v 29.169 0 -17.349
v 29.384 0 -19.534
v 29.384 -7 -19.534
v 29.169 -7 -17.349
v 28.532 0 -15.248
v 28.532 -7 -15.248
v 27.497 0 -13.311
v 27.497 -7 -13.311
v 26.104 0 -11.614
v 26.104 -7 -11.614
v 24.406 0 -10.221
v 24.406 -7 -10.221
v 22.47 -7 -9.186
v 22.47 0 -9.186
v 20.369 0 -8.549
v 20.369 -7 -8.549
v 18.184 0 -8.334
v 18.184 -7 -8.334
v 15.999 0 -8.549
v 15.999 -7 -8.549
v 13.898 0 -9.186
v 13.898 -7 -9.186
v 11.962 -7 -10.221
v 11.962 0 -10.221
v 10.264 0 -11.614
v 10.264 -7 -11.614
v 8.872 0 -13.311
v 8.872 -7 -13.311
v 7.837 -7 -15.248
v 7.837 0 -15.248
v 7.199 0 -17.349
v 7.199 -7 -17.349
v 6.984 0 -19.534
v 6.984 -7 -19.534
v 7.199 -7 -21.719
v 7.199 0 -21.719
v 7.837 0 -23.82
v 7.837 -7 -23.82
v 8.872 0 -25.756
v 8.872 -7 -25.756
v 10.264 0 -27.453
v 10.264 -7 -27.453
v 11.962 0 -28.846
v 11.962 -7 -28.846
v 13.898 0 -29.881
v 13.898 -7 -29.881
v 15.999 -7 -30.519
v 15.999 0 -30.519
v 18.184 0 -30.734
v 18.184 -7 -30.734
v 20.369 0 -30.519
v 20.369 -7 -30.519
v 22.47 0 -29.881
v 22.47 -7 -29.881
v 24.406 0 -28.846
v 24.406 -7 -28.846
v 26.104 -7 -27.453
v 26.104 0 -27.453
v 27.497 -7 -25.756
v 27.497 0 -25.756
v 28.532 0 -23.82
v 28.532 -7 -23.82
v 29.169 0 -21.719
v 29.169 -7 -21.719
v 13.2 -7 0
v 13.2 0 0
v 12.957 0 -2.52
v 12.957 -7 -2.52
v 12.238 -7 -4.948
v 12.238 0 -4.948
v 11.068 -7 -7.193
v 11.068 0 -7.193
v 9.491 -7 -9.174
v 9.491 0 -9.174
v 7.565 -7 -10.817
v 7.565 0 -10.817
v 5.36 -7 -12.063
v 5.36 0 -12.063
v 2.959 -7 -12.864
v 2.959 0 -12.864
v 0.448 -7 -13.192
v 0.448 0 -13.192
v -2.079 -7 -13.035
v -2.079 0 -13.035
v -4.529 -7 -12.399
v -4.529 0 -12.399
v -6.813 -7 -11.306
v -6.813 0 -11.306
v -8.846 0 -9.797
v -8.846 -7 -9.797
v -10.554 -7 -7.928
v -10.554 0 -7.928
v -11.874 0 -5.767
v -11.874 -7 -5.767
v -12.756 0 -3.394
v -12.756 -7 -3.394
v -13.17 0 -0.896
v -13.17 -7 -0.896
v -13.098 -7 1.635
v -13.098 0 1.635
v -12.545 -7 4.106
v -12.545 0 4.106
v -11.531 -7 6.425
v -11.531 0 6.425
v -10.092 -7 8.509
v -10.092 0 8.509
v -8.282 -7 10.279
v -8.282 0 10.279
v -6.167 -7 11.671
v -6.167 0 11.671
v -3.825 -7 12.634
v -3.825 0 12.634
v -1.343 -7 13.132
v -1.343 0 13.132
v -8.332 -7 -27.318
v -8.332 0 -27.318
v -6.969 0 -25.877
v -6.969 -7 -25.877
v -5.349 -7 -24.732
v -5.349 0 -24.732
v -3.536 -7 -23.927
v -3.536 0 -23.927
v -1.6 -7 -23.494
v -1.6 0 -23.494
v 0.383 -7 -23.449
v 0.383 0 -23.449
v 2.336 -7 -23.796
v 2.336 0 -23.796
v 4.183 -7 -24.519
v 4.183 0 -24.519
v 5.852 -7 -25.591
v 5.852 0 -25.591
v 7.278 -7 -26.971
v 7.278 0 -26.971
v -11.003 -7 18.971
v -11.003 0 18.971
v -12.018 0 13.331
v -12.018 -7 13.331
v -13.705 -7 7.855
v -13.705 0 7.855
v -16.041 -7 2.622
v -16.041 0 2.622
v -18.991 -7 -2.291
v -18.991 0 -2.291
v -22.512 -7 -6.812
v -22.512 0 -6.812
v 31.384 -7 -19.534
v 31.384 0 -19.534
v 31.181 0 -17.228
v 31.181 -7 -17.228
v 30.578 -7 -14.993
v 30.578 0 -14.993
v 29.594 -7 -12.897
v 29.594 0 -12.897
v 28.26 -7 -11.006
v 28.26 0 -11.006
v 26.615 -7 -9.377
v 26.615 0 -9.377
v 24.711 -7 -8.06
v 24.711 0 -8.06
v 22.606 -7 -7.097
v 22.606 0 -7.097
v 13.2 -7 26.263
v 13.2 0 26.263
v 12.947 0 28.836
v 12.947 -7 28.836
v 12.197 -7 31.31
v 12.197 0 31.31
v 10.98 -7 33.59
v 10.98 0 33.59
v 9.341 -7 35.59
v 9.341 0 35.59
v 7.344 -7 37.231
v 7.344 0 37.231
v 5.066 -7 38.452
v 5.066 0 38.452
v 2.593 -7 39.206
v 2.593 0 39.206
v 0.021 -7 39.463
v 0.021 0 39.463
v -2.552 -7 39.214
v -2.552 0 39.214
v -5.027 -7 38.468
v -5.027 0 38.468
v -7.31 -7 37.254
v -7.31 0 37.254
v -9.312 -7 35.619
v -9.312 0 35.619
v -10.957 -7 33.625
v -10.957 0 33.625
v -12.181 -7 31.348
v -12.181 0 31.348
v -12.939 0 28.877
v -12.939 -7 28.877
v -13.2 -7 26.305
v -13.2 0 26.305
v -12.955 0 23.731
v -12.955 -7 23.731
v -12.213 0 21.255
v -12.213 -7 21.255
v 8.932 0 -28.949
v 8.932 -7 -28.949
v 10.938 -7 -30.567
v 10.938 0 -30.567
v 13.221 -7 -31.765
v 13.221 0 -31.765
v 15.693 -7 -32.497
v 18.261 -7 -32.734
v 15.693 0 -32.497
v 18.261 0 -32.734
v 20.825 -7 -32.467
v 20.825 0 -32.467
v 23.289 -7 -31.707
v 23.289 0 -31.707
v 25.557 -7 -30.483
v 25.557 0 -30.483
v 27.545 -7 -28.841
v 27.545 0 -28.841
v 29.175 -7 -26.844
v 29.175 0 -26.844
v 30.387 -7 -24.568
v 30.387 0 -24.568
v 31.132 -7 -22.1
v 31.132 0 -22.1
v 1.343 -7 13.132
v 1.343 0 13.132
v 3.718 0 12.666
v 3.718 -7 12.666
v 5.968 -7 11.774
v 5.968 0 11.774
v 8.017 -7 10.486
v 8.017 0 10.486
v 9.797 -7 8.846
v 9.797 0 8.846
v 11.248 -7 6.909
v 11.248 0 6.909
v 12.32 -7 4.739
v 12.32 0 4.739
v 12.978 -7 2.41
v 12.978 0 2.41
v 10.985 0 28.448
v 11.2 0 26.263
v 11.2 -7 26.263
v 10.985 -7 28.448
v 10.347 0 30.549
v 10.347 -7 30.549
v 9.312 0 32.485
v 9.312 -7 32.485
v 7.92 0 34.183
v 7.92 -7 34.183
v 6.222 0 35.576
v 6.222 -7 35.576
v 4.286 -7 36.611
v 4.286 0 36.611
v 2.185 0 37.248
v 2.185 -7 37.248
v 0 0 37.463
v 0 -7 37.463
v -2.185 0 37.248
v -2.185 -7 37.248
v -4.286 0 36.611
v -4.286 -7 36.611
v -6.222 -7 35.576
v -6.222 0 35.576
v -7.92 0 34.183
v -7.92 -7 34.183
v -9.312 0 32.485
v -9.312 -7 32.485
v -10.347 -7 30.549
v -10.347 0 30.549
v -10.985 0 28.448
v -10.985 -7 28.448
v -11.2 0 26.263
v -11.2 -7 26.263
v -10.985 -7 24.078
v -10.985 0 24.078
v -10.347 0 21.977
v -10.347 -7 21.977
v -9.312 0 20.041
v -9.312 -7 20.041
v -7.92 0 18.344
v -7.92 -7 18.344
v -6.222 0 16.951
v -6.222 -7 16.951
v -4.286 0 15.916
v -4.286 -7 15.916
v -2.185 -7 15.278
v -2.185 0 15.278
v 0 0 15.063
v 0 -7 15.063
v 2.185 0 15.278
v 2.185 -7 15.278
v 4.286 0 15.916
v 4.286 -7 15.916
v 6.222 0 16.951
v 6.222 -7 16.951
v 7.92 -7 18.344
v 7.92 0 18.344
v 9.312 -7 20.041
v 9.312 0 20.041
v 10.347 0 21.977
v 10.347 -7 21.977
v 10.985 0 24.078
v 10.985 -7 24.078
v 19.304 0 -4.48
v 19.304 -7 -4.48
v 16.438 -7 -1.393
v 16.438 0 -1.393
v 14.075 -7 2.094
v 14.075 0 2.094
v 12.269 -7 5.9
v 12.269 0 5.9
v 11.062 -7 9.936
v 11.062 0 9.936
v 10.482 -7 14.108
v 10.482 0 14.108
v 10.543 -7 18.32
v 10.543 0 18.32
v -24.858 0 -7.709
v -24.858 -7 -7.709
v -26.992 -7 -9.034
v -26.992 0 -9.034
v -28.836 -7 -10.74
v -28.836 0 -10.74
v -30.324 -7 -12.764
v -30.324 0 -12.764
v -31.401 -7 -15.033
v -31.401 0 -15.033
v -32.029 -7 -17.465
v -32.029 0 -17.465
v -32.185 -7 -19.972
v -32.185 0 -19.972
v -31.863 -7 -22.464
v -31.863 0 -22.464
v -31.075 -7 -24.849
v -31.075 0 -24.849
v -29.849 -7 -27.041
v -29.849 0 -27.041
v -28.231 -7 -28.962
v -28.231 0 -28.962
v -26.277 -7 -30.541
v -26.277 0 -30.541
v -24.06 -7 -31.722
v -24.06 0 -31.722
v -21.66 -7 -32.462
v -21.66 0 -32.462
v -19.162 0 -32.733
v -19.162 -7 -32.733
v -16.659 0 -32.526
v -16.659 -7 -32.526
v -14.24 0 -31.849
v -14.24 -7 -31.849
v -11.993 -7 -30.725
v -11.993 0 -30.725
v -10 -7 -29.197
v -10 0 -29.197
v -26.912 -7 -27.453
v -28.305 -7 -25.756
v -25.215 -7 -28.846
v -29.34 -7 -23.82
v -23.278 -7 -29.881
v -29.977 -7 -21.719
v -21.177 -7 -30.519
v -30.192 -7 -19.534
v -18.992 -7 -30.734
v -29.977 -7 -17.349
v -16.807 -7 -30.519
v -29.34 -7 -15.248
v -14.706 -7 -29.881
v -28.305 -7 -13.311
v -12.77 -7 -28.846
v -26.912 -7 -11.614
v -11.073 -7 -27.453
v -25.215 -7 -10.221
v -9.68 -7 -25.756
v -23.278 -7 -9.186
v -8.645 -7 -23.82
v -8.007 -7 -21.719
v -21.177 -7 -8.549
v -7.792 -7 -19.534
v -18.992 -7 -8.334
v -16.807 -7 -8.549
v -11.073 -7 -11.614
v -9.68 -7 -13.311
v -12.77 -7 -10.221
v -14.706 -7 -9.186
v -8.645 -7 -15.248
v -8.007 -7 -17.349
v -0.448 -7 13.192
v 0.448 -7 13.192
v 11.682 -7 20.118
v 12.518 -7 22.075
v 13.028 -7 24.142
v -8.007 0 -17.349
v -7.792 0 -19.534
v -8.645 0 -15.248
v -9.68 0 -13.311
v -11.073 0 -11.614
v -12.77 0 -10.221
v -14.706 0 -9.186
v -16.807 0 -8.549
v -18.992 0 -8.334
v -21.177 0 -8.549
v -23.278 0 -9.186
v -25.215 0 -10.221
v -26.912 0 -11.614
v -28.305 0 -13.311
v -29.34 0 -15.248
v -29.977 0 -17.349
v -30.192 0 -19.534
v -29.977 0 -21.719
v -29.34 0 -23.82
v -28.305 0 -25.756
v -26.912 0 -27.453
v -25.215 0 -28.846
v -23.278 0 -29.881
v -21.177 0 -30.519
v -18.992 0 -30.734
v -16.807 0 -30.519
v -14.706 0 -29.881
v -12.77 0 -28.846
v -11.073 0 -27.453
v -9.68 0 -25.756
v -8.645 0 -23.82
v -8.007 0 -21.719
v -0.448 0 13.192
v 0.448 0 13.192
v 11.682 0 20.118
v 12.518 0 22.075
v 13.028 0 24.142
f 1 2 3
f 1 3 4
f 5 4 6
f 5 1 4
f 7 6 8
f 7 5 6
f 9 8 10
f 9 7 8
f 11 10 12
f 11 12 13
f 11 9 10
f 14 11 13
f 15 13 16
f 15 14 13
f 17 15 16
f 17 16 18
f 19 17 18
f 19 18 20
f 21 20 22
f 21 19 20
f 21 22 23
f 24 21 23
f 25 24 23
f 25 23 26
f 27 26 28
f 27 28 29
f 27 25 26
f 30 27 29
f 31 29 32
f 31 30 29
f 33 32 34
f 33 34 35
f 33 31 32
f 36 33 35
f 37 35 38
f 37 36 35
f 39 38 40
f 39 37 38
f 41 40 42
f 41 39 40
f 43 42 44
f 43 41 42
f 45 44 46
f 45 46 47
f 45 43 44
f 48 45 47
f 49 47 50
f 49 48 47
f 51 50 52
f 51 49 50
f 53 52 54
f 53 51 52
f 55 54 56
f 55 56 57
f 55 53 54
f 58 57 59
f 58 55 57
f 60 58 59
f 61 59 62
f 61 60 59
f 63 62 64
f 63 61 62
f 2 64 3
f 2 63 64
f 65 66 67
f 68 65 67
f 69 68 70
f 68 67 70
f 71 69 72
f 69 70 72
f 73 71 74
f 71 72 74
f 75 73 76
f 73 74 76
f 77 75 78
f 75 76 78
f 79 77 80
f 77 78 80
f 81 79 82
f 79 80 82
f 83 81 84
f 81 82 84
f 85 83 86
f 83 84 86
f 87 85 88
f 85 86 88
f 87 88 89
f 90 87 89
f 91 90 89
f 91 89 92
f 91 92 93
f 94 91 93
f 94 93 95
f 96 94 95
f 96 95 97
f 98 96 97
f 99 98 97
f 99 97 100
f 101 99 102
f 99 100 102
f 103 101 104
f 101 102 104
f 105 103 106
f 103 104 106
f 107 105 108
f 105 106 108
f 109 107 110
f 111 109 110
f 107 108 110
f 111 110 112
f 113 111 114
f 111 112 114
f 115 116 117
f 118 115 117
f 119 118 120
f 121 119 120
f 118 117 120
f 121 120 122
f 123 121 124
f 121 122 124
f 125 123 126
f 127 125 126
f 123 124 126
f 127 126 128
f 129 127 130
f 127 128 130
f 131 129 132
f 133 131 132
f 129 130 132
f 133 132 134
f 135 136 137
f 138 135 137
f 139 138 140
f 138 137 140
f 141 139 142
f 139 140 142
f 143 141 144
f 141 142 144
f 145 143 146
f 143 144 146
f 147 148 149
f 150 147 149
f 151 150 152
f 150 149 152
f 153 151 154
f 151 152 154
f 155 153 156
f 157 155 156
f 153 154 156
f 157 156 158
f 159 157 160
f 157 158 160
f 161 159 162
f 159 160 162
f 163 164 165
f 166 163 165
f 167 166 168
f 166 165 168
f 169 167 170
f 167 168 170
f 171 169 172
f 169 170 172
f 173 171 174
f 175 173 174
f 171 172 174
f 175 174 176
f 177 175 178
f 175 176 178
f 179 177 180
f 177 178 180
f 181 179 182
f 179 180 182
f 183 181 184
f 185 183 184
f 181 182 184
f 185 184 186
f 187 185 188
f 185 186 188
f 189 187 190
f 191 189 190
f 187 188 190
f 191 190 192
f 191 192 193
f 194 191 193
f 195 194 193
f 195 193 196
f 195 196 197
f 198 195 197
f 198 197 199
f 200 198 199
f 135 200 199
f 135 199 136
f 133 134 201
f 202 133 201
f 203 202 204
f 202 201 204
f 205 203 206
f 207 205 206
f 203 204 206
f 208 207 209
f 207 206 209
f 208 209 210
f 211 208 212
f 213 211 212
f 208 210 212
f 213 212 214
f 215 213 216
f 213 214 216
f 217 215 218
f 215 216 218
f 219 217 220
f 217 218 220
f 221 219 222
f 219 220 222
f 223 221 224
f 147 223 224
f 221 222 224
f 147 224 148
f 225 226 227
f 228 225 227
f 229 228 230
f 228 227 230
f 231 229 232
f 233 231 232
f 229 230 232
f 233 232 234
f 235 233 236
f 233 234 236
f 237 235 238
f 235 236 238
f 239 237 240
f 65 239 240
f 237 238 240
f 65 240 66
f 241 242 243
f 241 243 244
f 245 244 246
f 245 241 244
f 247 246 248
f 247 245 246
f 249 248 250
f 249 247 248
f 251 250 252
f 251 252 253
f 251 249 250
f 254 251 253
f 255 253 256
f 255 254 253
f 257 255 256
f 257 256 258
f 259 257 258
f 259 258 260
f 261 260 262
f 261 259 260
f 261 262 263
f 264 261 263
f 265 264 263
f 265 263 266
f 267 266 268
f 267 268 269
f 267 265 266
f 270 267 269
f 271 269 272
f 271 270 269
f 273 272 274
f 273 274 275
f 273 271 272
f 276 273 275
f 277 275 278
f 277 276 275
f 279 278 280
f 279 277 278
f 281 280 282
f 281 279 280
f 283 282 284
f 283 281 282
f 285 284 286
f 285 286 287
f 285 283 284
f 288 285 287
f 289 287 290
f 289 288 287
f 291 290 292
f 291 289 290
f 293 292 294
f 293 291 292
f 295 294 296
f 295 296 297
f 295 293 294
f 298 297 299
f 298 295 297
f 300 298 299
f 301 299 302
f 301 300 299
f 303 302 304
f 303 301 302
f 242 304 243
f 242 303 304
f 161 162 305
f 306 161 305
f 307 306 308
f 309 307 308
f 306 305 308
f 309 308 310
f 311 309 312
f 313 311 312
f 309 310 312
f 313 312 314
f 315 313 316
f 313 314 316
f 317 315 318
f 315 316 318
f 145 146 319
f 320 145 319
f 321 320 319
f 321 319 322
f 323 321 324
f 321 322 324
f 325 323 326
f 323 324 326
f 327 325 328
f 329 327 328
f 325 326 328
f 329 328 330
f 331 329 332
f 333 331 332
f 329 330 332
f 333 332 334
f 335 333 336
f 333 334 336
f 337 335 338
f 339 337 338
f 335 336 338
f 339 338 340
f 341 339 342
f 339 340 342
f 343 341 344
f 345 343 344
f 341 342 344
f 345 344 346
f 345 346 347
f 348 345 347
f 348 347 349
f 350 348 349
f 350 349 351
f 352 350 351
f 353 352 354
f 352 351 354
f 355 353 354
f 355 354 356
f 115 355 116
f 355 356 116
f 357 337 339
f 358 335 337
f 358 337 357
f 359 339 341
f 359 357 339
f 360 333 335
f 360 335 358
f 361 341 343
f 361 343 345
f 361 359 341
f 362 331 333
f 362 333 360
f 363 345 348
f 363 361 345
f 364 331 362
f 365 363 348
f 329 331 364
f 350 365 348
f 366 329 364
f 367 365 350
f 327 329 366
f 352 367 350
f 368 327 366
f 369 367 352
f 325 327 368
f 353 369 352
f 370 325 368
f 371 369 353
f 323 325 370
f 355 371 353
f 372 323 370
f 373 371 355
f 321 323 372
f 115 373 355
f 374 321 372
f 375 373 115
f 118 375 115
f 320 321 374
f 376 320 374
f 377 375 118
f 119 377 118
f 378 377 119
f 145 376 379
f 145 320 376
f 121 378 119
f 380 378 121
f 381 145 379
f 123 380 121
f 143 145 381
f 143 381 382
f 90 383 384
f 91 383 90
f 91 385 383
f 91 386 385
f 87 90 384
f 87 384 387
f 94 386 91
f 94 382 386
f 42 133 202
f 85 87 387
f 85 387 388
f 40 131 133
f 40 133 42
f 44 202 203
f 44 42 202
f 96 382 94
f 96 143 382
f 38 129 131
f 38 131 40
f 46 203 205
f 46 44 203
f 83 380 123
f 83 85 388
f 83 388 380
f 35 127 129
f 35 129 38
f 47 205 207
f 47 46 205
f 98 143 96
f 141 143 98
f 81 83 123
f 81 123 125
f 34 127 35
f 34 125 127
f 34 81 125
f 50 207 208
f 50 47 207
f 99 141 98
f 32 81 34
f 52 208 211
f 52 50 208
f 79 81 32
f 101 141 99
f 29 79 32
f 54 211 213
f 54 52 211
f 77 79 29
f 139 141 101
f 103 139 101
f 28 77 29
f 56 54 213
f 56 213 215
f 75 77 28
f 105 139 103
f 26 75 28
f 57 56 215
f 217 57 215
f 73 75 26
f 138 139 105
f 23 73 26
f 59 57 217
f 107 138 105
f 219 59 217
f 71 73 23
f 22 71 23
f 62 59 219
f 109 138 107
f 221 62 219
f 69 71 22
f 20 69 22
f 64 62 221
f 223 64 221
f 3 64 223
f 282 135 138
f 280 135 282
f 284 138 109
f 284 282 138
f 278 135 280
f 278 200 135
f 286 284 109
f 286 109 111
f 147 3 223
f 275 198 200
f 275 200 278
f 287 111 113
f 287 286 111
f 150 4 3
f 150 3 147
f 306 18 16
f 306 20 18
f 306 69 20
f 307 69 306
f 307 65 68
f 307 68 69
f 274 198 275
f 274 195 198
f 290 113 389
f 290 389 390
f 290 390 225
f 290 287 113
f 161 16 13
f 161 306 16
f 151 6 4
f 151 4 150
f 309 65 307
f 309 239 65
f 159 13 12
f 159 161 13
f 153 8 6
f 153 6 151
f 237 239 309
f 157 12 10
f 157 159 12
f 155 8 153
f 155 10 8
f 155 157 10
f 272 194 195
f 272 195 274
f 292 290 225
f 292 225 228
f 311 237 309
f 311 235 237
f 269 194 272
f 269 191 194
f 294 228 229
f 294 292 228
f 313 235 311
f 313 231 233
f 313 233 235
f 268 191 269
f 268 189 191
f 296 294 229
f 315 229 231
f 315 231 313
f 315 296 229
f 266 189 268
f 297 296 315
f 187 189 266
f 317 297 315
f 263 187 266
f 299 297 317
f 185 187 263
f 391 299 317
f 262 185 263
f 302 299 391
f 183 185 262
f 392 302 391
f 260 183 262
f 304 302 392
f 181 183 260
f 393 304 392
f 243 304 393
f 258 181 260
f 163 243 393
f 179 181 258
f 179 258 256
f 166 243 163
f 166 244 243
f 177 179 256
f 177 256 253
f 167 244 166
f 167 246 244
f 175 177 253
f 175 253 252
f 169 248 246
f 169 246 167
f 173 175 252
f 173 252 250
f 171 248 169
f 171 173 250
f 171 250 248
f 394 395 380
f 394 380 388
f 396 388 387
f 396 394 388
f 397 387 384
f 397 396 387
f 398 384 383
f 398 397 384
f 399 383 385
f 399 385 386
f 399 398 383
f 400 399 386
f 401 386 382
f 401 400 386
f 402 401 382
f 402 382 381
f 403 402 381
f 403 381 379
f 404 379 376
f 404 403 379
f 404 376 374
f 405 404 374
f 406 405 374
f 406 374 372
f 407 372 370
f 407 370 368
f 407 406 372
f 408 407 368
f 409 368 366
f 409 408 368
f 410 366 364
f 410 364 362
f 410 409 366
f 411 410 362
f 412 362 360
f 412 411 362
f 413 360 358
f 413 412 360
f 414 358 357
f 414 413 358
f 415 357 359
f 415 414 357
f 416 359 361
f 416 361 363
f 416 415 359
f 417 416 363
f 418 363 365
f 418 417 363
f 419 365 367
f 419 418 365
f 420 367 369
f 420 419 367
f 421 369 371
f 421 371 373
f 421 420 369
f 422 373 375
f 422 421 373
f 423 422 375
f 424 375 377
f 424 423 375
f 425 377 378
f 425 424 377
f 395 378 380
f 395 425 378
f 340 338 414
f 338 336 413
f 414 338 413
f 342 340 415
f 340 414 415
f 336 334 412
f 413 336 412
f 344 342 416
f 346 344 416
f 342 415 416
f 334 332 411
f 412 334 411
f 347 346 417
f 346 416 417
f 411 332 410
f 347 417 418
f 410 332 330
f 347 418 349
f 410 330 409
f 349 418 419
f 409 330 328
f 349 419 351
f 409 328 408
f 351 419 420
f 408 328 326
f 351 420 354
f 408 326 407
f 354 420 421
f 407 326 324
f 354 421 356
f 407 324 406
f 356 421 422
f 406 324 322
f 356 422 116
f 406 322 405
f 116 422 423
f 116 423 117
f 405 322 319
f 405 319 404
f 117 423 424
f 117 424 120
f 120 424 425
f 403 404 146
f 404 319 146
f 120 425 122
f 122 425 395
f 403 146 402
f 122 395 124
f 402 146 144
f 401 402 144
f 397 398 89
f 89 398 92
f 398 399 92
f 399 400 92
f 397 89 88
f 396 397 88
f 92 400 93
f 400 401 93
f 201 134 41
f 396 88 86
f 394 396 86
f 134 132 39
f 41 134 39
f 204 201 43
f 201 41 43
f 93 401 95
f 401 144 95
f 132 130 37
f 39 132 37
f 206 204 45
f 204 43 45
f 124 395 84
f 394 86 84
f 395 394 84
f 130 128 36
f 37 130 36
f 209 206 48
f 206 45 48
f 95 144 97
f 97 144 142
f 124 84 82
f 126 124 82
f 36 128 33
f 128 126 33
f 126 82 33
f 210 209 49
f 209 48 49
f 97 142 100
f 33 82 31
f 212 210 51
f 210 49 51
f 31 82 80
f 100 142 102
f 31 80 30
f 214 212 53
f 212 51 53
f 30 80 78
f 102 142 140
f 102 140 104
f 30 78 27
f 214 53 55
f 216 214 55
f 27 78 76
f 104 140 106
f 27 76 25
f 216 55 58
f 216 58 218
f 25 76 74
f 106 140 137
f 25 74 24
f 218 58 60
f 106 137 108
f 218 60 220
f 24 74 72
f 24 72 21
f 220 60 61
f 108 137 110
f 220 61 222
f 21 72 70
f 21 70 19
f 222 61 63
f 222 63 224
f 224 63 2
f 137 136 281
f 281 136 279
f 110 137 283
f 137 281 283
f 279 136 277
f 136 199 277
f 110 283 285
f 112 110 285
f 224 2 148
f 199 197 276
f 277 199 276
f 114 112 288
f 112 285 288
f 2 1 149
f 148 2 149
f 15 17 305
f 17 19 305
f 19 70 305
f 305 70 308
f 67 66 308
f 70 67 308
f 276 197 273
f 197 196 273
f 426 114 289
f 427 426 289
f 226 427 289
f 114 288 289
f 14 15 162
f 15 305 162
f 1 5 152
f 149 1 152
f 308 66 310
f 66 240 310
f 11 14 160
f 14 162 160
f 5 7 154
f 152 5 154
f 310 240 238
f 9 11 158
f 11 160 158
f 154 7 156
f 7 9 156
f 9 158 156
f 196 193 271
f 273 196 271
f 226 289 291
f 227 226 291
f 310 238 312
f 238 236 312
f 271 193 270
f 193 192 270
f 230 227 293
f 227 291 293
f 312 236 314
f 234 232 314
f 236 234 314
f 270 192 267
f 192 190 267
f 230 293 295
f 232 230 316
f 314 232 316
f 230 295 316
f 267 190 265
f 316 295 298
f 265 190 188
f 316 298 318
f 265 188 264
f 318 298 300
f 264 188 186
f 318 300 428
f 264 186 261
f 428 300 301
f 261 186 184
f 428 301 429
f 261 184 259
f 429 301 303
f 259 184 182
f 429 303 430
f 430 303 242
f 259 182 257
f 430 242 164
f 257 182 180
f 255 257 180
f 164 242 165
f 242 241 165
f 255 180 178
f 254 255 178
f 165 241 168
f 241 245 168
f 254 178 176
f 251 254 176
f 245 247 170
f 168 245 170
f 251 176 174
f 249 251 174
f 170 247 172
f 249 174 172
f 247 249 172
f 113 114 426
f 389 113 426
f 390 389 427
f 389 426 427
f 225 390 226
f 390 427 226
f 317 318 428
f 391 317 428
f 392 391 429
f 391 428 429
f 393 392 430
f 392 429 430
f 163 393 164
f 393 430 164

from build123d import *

# Parameters (mm, degrees)
F0_R     = 11.2
F1_DEPTH = 7


with BuildPart() as f1:
    # F0 (on Front) → F1 (new body)
    with BuildSketch(Plane.XZ):
        with BuildLine():
            ThreePointArc((1.342519, 13.131551), (9.79697, 8.846433), (13.2, 0))
            ThreePointArc((13.2, 0), (-8.846433, -9.79697), (-1.342519, 13.131551))
            ThreePointArc((-1.342519, 13.131551), (-6.828327, 14.966469), (-11.002825, 18.970789))
            ThreePointArc((-11.002825, 18.970789), (-14.793964, 5.203063), (-22.511932, -6.81176))
            ThreePointArc((-22.511932, -6.81176), (-10.999135, -9.029118), (-5.792273, -19.533867))
            ThreePointArc((-5.792273, -19.533867), (-6.443274, -23.628086), (-8.332066, -27.318466))
            ThreePointArc((-8.332066, -27.318466), (-0.609837, -23.422527), (7.278308, -26.970528))
            ThreePointArc((7.278308, -26.970528), (7.731584, -11.472533), (22.605845, -7.096501))
            ThreePointArc((22.605845, -7.096501), (13.099262, 3.962593), (10.542851, 18.320289))
            ThreePointArc((10.542851, 18.320289), (6.484308, 14.765549), (1.342519, 13.131551))
        make_face()
        with BuildLine():
            ThreePointArc((-1.342519, 13.131551), (0, 13.2), (1.342519, 13.131551))
            ThreePointArc((1.342519, 13.131551), (6.484308, 14.765549), (10.542851, 18.320289))
            ThreePointArc((10.542851, 18.320289), (12.5181, 22.075361), (13.2, 26.263103))
            ThreePointArc((13.2, 26.263103), (-3.808064, 38.901878), (-11.002825, 18.970789))
            ThreePointArc((-11.002825, 18.970789), (-6.828327, 14.966469), (-1.342519, 13.131551))
        make_face()
        with Locations((0, 26.263103)):
            Circle(F0_R, mode=Mode.SUBTRACT)
        with BuildLine():
            ThreePointArc((31.38409, -19.533867), (28.968504, -11.922269), (22.605845, -7.096501))
            ThreePointArc((22.605845, -7.096501), (7.731584, -11.472533), (7.278308, -26.970528))
            ThreePointArc((7.278308, -26.970528), (22.075342, -32.147279), (31.38409, -19.533867))
        make_face()
        with Locations((18.18409, -19.533867)):
            Circle(F0_R, mode=Mode.SUBTRACT)
        with BuildLine():
            ThreePointArc((-5.792273, -19.533867), (-10.999135, -9.029118), (-22.511932, -6.81176))
            ThreePointArc((-22.511932, -6.81176), (-29.849441, -27.041323), (-8.332066, -27.318466))
            ThreePointArc((-8.332066, -27.318466), (-6.443274, -23.628086), (-5.792273, -19.533867))
        make_face()
        with Locations((-18.992273, -19.533867)):
            Circle(F0_R, mode=Mode.SUBTRACT)
    extrude(amount=F1_DEPTH)


solid = f1.part
